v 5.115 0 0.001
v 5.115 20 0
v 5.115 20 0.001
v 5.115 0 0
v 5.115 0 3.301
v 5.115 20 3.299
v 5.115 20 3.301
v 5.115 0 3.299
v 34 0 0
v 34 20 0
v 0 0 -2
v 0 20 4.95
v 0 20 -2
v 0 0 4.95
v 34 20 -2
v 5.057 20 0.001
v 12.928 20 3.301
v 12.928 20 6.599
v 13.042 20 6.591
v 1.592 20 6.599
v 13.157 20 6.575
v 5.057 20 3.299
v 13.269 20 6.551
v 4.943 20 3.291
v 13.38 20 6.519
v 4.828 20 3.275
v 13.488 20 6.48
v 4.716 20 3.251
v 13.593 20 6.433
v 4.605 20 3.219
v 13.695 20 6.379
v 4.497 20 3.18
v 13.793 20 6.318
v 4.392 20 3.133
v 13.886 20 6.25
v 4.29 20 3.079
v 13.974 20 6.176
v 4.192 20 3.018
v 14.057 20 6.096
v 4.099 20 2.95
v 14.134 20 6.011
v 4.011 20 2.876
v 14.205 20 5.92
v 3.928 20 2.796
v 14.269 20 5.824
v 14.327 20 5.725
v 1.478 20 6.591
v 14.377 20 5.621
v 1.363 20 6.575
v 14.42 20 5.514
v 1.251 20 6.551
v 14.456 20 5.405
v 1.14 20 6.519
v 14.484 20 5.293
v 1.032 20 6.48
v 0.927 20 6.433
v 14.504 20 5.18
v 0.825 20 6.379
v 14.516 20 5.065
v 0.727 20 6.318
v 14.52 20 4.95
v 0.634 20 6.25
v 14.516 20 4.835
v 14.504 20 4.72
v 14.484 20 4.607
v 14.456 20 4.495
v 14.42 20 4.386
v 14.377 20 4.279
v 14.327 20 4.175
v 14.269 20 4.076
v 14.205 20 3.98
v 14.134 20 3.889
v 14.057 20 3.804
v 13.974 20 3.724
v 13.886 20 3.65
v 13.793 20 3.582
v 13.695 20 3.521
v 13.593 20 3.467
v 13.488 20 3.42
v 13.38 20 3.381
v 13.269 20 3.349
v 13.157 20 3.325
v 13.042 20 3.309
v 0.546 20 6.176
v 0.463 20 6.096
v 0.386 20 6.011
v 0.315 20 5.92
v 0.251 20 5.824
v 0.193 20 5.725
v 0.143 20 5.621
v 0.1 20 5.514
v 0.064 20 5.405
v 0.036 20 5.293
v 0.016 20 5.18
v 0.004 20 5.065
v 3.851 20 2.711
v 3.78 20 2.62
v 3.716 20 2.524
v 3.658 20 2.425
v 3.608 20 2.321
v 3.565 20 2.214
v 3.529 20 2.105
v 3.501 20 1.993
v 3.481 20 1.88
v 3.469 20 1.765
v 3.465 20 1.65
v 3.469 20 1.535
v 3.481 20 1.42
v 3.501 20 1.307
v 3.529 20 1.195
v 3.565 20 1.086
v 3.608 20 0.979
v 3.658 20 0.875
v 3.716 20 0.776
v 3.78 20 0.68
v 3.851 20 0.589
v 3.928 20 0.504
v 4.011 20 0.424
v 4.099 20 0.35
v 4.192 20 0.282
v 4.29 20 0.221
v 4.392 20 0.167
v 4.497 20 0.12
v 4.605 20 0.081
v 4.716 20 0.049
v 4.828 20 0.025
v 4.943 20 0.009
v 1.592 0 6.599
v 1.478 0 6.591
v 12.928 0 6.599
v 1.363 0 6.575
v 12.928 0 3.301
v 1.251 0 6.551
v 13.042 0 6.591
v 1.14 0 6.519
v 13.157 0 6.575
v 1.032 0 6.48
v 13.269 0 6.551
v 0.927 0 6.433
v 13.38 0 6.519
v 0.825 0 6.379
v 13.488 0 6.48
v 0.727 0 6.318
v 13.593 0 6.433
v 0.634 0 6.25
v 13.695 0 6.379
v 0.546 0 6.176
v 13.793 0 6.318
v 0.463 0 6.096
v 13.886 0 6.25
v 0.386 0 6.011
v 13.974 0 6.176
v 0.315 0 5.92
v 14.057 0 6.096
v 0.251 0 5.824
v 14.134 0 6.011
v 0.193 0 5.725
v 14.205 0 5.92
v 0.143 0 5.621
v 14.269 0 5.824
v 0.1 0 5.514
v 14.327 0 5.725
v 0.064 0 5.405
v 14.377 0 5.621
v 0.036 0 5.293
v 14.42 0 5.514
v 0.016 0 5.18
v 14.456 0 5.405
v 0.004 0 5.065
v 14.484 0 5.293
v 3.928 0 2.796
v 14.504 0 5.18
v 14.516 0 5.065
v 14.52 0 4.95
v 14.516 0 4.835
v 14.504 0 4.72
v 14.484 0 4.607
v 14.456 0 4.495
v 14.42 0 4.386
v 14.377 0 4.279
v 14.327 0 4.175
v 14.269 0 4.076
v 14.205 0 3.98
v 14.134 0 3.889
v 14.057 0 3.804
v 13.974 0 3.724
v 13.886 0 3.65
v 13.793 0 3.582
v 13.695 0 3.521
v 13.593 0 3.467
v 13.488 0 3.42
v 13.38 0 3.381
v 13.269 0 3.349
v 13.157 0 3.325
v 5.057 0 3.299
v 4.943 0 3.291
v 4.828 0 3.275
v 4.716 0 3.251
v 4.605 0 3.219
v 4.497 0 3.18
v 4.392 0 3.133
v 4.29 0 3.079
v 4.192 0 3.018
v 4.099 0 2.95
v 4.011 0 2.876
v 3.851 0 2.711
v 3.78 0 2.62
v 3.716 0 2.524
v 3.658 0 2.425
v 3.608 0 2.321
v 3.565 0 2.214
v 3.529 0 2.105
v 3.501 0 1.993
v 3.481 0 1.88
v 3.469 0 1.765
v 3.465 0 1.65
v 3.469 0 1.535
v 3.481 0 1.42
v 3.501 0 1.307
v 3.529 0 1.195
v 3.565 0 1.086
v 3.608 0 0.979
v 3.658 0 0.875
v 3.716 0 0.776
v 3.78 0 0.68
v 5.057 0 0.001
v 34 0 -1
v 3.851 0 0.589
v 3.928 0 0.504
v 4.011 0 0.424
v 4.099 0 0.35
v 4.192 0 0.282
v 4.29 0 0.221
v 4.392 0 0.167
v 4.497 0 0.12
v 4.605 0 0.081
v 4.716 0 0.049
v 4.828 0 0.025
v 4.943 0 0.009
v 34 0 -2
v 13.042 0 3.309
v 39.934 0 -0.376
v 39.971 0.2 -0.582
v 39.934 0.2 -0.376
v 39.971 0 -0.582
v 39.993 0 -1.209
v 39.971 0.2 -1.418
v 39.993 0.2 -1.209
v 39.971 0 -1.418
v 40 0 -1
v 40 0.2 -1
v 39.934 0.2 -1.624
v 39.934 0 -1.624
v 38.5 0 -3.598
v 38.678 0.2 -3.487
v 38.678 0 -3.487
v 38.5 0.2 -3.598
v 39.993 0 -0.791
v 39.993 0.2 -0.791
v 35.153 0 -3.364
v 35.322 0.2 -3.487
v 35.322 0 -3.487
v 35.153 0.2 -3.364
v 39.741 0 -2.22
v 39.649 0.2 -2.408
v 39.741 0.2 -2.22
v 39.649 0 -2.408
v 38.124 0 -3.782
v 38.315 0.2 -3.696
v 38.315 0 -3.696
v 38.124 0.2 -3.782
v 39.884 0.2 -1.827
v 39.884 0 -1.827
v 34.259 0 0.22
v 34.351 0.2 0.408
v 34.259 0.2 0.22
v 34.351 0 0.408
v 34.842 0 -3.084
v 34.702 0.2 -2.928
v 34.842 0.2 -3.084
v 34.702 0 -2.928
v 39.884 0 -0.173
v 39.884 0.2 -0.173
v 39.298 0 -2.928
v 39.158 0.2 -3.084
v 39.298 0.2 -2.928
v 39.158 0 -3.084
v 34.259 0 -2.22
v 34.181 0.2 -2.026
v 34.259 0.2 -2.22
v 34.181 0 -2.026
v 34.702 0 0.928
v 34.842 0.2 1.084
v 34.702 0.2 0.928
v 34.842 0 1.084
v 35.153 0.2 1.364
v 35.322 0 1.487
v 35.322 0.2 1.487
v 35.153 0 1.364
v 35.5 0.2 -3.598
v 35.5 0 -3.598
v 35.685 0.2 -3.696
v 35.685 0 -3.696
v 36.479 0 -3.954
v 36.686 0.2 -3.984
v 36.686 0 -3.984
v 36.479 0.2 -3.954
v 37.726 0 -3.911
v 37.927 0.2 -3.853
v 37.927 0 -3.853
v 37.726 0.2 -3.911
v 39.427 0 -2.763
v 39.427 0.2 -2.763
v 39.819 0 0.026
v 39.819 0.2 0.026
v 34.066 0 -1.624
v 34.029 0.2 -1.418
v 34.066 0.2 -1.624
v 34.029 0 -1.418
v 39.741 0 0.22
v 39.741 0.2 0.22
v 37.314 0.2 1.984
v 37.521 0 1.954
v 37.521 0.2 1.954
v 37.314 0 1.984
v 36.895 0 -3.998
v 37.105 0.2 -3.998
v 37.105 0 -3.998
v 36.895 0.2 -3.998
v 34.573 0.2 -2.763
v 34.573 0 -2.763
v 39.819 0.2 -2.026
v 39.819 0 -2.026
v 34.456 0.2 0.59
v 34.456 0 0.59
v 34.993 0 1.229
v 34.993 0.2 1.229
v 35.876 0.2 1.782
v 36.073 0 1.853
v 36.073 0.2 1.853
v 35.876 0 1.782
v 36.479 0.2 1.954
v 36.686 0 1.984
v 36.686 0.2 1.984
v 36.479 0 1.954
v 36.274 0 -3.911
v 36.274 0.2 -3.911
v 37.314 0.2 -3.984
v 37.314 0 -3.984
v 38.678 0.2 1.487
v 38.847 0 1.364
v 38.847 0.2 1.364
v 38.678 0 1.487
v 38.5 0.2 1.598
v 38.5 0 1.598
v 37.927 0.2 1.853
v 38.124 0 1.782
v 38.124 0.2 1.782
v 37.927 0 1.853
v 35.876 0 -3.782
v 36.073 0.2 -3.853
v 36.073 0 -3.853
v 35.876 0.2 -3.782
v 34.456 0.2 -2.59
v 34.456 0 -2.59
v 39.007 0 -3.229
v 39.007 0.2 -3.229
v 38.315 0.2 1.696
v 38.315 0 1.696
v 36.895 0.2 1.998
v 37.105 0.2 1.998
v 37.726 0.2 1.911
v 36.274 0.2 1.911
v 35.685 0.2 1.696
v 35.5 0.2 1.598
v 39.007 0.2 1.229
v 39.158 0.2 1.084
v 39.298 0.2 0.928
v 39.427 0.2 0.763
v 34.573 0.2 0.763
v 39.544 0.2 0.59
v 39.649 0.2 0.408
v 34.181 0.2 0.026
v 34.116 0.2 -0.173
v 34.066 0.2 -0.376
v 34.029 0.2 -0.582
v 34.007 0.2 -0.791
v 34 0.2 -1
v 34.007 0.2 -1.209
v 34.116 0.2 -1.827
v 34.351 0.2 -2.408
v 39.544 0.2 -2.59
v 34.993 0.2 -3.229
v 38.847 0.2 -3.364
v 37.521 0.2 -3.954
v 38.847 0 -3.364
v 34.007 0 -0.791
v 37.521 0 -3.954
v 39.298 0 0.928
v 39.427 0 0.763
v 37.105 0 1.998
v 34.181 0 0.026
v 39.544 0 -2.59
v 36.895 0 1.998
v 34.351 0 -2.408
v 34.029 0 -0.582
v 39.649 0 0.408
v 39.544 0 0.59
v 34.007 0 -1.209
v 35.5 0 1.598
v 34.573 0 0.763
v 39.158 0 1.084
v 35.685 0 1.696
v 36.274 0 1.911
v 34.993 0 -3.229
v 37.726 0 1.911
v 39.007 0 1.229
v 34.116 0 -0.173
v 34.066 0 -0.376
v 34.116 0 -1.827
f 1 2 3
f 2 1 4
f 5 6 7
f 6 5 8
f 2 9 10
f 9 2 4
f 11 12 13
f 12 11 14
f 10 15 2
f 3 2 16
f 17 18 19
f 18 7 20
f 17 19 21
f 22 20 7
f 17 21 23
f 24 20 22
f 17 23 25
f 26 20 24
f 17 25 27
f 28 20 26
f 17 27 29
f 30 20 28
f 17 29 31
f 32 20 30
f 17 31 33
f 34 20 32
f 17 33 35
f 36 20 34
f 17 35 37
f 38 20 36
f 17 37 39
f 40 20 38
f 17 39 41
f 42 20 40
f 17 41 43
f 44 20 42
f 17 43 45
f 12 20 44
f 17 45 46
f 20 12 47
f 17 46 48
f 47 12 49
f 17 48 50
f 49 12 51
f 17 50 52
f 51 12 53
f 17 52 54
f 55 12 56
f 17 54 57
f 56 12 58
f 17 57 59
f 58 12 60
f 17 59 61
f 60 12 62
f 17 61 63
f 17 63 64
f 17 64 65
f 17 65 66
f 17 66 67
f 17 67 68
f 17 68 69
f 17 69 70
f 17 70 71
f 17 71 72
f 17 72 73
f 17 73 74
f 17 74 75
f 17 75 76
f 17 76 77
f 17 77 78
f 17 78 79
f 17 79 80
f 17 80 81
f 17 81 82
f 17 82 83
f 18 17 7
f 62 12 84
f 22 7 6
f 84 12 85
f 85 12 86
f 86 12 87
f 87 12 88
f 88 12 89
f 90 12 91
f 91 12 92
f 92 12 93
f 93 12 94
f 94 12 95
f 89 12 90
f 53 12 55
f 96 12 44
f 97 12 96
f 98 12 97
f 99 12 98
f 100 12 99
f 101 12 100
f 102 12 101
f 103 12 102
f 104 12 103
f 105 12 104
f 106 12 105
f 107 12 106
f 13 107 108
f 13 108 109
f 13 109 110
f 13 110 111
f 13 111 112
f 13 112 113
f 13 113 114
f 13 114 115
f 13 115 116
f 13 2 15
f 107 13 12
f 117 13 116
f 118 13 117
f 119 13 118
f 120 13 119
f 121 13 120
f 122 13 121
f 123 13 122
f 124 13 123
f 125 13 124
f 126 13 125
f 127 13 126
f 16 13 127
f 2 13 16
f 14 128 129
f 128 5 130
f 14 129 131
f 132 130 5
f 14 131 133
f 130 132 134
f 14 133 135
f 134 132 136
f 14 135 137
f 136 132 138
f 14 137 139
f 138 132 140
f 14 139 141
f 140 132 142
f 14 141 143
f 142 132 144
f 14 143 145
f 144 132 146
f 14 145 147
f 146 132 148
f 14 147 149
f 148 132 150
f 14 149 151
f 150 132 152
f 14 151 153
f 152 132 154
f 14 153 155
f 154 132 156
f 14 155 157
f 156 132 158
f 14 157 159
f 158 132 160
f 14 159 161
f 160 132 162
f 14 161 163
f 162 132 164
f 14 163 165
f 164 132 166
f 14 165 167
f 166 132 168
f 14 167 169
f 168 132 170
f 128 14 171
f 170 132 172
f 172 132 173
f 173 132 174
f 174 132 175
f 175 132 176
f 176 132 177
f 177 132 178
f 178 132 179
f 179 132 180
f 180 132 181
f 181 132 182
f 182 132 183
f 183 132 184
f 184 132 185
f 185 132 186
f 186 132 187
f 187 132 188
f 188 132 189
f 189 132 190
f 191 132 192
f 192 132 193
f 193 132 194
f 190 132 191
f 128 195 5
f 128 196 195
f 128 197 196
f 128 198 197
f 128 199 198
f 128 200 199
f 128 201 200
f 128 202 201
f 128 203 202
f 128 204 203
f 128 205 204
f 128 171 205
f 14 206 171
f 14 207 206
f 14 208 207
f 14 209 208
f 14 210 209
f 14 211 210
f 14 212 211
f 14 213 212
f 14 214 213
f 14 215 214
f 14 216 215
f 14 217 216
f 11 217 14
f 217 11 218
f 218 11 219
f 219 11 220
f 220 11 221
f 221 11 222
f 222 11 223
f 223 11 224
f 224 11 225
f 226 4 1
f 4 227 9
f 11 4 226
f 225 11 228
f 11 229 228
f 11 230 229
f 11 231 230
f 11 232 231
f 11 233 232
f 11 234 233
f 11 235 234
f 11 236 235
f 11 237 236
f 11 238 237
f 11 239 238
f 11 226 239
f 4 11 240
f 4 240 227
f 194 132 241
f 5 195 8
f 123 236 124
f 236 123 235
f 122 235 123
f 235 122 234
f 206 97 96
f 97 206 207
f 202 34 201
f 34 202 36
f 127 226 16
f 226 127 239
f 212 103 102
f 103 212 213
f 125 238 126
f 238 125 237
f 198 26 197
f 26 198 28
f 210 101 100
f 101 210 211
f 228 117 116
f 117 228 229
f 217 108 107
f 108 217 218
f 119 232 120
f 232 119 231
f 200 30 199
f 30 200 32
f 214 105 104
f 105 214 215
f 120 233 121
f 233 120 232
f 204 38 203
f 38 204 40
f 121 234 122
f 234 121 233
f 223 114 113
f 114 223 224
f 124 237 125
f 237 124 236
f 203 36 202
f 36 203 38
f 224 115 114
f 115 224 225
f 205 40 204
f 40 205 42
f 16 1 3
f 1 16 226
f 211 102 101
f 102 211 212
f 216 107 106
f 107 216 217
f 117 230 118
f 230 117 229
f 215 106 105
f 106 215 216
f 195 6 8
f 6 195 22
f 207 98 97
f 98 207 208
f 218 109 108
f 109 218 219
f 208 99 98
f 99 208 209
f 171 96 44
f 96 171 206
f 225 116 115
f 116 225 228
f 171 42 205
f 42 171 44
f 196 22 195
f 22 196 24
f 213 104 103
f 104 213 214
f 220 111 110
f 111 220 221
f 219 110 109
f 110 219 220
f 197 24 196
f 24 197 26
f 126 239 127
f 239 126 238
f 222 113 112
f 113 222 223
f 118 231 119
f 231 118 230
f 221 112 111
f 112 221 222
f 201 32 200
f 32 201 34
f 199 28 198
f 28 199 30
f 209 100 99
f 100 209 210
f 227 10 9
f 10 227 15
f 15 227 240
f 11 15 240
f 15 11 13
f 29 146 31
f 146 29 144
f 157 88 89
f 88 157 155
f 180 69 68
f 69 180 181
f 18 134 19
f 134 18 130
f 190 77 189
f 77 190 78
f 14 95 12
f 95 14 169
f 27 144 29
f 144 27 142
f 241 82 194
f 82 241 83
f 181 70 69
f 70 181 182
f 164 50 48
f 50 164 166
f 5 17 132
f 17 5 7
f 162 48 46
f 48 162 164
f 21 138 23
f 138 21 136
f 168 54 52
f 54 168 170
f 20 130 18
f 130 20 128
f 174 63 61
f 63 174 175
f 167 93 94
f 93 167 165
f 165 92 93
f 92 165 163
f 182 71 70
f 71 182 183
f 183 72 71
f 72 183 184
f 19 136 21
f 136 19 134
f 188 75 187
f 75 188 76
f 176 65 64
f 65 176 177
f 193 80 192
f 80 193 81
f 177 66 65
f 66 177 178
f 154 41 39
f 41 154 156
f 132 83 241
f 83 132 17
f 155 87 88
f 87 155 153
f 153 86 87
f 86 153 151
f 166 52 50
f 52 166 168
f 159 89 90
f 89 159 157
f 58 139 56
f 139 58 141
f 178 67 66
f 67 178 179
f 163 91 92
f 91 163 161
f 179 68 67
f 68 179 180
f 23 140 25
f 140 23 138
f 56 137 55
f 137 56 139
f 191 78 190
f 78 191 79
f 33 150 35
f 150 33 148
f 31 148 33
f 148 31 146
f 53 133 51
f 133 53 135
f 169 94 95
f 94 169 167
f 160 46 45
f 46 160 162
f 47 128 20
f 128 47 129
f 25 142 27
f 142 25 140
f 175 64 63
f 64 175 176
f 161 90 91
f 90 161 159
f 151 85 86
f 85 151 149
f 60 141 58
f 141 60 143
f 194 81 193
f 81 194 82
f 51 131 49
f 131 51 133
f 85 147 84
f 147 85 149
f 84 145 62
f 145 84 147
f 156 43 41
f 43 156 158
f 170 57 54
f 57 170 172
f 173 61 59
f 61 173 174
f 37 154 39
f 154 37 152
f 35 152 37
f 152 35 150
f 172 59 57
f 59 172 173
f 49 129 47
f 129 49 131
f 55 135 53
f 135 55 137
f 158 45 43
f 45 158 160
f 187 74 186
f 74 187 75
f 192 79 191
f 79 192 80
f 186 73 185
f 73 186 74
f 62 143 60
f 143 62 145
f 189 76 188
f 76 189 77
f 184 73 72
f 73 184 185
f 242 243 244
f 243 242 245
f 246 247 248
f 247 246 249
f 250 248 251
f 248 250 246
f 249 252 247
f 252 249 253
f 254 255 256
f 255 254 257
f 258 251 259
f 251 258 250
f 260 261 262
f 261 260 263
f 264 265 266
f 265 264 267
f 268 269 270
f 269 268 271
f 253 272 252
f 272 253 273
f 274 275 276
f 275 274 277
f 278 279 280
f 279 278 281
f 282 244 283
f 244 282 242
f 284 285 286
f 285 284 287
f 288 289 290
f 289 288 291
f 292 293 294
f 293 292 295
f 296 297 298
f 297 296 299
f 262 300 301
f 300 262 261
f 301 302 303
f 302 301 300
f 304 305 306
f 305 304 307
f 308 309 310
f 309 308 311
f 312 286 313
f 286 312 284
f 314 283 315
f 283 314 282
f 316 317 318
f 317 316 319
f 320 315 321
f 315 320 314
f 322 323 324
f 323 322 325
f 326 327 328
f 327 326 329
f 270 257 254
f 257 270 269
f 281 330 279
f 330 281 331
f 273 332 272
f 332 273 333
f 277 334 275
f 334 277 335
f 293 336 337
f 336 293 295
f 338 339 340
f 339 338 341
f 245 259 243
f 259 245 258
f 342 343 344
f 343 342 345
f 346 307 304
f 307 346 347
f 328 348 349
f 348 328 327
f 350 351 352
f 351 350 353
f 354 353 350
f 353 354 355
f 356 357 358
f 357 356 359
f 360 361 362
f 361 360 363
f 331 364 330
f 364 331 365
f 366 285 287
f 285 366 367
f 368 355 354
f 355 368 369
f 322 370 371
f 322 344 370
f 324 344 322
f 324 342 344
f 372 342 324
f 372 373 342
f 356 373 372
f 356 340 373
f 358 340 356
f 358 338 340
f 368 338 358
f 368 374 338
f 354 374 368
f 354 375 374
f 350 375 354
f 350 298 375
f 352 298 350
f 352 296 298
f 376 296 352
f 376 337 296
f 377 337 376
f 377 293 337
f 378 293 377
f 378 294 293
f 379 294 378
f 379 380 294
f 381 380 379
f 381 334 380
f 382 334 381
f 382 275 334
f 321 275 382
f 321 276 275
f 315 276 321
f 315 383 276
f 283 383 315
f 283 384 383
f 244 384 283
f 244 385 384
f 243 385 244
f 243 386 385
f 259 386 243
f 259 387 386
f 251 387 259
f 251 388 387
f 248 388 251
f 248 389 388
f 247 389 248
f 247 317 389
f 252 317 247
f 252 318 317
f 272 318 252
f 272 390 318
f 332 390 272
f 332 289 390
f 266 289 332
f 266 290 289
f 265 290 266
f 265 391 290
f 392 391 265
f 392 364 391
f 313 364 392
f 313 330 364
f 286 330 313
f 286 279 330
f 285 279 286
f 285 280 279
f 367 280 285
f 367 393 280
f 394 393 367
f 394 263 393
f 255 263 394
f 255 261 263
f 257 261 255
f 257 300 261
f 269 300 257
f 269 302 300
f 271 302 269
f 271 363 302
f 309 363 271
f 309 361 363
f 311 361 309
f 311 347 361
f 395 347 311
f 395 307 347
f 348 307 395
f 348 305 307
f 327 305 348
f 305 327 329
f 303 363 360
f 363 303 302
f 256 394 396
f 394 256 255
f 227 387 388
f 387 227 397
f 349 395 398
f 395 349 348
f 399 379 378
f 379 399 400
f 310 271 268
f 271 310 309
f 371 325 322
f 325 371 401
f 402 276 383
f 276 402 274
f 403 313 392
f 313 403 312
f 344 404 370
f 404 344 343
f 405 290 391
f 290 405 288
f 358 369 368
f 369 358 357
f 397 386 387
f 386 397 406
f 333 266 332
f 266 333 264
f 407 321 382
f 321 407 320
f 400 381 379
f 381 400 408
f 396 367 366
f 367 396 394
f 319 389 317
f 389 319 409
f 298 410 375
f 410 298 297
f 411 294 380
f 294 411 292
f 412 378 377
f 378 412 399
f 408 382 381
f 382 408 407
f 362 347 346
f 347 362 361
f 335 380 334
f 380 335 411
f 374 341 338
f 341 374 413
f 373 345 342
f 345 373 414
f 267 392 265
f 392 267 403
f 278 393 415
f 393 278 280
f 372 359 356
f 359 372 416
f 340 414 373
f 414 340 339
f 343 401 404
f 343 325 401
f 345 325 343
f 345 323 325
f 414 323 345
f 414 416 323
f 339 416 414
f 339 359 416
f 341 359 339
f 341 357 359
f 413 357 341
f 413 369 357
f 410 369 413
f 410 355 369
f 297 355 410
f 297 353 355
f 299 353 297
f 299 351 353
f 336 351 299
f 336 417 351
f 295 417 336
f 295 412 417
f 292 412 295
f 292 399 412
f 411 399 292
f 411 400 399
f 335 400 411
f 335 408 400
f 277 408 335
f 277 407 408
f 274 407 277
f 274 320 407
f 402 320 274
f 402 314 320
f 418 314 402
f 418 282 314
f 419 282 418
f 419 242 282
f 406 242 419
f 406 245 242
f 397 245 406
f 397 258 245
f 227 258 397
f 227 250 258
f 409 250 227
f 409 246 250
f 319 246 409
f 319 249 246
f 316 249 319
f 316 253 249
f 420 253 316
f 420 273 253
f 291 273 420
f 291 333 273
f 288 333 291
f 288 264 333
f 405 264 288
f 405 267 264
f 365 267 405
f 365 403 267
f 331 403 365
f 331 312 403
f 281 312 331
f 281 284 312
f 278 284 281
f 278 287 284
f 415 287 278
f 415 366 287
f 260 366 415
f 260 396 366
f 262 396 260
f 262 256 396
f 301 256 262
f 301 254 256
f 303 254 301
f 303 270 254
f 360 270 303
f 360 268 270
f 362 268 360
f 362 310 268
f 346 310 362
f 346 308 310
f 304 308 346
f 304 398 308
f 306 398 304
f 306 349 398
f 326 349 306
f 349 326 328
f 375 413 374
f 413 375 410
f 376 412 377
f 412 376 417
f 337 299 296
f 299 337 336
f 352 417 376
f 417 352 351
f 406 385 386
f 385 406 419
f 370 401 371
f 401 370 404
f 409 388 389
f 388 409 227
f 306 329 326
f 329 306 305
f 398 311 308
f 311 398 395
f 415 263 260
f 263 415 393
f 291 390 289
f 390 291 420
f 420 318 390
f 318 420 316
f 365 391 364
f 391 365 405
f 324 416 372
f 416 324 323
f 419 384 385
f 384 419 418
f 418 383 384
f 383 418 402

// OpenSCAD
$fn = 90;

EPS = 0.10;
LAYER_HEIGHT = 0.2;
ADHESION_PAD = true;

L = 34;
W = 20;
THICKNESS = 2.0;

HOOK_T = 3.3;
HOOK_L = 3.9*HOOK_T;
HOOK_H = 1.5*HOOK_T;
HOOK_Q = 1.55;

module T_cylinder(q=1) {
    rotate([-90, 0,0])
        cylinder(d=HOOK_T, h=q*W);
}

translate([0,0,-THICKNESS])
    cube([L, W, THICKNESS]);
difference() {
    cube([HOOK_Q*HOOK_T, W, HOOK_H]);
    translate([HOOK_Q*HOOK_T,-W, HOOK_T/2])
        T_cylinder(q=3);
}
hull() {
    translate([HOOK_T/2,0, HOOK_H])
        T_cylinder();
    translate([HOOK_L,0, HOOK_H])
        T_cylinder();
}

if(ADHESION_PAD)
        translate([L+3, 0, -THICKNESS/2])
            #rotate([-90, 0,0])
                cylinder(r=3, h=LAYER_HEIGHT);
    // difference() {
    //     translate([L, 0,1])
    //         rotate([-90])
    //             cylinder(r=3, h=LAYER_HEIGHT);
    //     translate([0,-EPS,-THICKNESS])
    //         cube([L+EPS, W, THICKNESS+EPS]);
    // }
